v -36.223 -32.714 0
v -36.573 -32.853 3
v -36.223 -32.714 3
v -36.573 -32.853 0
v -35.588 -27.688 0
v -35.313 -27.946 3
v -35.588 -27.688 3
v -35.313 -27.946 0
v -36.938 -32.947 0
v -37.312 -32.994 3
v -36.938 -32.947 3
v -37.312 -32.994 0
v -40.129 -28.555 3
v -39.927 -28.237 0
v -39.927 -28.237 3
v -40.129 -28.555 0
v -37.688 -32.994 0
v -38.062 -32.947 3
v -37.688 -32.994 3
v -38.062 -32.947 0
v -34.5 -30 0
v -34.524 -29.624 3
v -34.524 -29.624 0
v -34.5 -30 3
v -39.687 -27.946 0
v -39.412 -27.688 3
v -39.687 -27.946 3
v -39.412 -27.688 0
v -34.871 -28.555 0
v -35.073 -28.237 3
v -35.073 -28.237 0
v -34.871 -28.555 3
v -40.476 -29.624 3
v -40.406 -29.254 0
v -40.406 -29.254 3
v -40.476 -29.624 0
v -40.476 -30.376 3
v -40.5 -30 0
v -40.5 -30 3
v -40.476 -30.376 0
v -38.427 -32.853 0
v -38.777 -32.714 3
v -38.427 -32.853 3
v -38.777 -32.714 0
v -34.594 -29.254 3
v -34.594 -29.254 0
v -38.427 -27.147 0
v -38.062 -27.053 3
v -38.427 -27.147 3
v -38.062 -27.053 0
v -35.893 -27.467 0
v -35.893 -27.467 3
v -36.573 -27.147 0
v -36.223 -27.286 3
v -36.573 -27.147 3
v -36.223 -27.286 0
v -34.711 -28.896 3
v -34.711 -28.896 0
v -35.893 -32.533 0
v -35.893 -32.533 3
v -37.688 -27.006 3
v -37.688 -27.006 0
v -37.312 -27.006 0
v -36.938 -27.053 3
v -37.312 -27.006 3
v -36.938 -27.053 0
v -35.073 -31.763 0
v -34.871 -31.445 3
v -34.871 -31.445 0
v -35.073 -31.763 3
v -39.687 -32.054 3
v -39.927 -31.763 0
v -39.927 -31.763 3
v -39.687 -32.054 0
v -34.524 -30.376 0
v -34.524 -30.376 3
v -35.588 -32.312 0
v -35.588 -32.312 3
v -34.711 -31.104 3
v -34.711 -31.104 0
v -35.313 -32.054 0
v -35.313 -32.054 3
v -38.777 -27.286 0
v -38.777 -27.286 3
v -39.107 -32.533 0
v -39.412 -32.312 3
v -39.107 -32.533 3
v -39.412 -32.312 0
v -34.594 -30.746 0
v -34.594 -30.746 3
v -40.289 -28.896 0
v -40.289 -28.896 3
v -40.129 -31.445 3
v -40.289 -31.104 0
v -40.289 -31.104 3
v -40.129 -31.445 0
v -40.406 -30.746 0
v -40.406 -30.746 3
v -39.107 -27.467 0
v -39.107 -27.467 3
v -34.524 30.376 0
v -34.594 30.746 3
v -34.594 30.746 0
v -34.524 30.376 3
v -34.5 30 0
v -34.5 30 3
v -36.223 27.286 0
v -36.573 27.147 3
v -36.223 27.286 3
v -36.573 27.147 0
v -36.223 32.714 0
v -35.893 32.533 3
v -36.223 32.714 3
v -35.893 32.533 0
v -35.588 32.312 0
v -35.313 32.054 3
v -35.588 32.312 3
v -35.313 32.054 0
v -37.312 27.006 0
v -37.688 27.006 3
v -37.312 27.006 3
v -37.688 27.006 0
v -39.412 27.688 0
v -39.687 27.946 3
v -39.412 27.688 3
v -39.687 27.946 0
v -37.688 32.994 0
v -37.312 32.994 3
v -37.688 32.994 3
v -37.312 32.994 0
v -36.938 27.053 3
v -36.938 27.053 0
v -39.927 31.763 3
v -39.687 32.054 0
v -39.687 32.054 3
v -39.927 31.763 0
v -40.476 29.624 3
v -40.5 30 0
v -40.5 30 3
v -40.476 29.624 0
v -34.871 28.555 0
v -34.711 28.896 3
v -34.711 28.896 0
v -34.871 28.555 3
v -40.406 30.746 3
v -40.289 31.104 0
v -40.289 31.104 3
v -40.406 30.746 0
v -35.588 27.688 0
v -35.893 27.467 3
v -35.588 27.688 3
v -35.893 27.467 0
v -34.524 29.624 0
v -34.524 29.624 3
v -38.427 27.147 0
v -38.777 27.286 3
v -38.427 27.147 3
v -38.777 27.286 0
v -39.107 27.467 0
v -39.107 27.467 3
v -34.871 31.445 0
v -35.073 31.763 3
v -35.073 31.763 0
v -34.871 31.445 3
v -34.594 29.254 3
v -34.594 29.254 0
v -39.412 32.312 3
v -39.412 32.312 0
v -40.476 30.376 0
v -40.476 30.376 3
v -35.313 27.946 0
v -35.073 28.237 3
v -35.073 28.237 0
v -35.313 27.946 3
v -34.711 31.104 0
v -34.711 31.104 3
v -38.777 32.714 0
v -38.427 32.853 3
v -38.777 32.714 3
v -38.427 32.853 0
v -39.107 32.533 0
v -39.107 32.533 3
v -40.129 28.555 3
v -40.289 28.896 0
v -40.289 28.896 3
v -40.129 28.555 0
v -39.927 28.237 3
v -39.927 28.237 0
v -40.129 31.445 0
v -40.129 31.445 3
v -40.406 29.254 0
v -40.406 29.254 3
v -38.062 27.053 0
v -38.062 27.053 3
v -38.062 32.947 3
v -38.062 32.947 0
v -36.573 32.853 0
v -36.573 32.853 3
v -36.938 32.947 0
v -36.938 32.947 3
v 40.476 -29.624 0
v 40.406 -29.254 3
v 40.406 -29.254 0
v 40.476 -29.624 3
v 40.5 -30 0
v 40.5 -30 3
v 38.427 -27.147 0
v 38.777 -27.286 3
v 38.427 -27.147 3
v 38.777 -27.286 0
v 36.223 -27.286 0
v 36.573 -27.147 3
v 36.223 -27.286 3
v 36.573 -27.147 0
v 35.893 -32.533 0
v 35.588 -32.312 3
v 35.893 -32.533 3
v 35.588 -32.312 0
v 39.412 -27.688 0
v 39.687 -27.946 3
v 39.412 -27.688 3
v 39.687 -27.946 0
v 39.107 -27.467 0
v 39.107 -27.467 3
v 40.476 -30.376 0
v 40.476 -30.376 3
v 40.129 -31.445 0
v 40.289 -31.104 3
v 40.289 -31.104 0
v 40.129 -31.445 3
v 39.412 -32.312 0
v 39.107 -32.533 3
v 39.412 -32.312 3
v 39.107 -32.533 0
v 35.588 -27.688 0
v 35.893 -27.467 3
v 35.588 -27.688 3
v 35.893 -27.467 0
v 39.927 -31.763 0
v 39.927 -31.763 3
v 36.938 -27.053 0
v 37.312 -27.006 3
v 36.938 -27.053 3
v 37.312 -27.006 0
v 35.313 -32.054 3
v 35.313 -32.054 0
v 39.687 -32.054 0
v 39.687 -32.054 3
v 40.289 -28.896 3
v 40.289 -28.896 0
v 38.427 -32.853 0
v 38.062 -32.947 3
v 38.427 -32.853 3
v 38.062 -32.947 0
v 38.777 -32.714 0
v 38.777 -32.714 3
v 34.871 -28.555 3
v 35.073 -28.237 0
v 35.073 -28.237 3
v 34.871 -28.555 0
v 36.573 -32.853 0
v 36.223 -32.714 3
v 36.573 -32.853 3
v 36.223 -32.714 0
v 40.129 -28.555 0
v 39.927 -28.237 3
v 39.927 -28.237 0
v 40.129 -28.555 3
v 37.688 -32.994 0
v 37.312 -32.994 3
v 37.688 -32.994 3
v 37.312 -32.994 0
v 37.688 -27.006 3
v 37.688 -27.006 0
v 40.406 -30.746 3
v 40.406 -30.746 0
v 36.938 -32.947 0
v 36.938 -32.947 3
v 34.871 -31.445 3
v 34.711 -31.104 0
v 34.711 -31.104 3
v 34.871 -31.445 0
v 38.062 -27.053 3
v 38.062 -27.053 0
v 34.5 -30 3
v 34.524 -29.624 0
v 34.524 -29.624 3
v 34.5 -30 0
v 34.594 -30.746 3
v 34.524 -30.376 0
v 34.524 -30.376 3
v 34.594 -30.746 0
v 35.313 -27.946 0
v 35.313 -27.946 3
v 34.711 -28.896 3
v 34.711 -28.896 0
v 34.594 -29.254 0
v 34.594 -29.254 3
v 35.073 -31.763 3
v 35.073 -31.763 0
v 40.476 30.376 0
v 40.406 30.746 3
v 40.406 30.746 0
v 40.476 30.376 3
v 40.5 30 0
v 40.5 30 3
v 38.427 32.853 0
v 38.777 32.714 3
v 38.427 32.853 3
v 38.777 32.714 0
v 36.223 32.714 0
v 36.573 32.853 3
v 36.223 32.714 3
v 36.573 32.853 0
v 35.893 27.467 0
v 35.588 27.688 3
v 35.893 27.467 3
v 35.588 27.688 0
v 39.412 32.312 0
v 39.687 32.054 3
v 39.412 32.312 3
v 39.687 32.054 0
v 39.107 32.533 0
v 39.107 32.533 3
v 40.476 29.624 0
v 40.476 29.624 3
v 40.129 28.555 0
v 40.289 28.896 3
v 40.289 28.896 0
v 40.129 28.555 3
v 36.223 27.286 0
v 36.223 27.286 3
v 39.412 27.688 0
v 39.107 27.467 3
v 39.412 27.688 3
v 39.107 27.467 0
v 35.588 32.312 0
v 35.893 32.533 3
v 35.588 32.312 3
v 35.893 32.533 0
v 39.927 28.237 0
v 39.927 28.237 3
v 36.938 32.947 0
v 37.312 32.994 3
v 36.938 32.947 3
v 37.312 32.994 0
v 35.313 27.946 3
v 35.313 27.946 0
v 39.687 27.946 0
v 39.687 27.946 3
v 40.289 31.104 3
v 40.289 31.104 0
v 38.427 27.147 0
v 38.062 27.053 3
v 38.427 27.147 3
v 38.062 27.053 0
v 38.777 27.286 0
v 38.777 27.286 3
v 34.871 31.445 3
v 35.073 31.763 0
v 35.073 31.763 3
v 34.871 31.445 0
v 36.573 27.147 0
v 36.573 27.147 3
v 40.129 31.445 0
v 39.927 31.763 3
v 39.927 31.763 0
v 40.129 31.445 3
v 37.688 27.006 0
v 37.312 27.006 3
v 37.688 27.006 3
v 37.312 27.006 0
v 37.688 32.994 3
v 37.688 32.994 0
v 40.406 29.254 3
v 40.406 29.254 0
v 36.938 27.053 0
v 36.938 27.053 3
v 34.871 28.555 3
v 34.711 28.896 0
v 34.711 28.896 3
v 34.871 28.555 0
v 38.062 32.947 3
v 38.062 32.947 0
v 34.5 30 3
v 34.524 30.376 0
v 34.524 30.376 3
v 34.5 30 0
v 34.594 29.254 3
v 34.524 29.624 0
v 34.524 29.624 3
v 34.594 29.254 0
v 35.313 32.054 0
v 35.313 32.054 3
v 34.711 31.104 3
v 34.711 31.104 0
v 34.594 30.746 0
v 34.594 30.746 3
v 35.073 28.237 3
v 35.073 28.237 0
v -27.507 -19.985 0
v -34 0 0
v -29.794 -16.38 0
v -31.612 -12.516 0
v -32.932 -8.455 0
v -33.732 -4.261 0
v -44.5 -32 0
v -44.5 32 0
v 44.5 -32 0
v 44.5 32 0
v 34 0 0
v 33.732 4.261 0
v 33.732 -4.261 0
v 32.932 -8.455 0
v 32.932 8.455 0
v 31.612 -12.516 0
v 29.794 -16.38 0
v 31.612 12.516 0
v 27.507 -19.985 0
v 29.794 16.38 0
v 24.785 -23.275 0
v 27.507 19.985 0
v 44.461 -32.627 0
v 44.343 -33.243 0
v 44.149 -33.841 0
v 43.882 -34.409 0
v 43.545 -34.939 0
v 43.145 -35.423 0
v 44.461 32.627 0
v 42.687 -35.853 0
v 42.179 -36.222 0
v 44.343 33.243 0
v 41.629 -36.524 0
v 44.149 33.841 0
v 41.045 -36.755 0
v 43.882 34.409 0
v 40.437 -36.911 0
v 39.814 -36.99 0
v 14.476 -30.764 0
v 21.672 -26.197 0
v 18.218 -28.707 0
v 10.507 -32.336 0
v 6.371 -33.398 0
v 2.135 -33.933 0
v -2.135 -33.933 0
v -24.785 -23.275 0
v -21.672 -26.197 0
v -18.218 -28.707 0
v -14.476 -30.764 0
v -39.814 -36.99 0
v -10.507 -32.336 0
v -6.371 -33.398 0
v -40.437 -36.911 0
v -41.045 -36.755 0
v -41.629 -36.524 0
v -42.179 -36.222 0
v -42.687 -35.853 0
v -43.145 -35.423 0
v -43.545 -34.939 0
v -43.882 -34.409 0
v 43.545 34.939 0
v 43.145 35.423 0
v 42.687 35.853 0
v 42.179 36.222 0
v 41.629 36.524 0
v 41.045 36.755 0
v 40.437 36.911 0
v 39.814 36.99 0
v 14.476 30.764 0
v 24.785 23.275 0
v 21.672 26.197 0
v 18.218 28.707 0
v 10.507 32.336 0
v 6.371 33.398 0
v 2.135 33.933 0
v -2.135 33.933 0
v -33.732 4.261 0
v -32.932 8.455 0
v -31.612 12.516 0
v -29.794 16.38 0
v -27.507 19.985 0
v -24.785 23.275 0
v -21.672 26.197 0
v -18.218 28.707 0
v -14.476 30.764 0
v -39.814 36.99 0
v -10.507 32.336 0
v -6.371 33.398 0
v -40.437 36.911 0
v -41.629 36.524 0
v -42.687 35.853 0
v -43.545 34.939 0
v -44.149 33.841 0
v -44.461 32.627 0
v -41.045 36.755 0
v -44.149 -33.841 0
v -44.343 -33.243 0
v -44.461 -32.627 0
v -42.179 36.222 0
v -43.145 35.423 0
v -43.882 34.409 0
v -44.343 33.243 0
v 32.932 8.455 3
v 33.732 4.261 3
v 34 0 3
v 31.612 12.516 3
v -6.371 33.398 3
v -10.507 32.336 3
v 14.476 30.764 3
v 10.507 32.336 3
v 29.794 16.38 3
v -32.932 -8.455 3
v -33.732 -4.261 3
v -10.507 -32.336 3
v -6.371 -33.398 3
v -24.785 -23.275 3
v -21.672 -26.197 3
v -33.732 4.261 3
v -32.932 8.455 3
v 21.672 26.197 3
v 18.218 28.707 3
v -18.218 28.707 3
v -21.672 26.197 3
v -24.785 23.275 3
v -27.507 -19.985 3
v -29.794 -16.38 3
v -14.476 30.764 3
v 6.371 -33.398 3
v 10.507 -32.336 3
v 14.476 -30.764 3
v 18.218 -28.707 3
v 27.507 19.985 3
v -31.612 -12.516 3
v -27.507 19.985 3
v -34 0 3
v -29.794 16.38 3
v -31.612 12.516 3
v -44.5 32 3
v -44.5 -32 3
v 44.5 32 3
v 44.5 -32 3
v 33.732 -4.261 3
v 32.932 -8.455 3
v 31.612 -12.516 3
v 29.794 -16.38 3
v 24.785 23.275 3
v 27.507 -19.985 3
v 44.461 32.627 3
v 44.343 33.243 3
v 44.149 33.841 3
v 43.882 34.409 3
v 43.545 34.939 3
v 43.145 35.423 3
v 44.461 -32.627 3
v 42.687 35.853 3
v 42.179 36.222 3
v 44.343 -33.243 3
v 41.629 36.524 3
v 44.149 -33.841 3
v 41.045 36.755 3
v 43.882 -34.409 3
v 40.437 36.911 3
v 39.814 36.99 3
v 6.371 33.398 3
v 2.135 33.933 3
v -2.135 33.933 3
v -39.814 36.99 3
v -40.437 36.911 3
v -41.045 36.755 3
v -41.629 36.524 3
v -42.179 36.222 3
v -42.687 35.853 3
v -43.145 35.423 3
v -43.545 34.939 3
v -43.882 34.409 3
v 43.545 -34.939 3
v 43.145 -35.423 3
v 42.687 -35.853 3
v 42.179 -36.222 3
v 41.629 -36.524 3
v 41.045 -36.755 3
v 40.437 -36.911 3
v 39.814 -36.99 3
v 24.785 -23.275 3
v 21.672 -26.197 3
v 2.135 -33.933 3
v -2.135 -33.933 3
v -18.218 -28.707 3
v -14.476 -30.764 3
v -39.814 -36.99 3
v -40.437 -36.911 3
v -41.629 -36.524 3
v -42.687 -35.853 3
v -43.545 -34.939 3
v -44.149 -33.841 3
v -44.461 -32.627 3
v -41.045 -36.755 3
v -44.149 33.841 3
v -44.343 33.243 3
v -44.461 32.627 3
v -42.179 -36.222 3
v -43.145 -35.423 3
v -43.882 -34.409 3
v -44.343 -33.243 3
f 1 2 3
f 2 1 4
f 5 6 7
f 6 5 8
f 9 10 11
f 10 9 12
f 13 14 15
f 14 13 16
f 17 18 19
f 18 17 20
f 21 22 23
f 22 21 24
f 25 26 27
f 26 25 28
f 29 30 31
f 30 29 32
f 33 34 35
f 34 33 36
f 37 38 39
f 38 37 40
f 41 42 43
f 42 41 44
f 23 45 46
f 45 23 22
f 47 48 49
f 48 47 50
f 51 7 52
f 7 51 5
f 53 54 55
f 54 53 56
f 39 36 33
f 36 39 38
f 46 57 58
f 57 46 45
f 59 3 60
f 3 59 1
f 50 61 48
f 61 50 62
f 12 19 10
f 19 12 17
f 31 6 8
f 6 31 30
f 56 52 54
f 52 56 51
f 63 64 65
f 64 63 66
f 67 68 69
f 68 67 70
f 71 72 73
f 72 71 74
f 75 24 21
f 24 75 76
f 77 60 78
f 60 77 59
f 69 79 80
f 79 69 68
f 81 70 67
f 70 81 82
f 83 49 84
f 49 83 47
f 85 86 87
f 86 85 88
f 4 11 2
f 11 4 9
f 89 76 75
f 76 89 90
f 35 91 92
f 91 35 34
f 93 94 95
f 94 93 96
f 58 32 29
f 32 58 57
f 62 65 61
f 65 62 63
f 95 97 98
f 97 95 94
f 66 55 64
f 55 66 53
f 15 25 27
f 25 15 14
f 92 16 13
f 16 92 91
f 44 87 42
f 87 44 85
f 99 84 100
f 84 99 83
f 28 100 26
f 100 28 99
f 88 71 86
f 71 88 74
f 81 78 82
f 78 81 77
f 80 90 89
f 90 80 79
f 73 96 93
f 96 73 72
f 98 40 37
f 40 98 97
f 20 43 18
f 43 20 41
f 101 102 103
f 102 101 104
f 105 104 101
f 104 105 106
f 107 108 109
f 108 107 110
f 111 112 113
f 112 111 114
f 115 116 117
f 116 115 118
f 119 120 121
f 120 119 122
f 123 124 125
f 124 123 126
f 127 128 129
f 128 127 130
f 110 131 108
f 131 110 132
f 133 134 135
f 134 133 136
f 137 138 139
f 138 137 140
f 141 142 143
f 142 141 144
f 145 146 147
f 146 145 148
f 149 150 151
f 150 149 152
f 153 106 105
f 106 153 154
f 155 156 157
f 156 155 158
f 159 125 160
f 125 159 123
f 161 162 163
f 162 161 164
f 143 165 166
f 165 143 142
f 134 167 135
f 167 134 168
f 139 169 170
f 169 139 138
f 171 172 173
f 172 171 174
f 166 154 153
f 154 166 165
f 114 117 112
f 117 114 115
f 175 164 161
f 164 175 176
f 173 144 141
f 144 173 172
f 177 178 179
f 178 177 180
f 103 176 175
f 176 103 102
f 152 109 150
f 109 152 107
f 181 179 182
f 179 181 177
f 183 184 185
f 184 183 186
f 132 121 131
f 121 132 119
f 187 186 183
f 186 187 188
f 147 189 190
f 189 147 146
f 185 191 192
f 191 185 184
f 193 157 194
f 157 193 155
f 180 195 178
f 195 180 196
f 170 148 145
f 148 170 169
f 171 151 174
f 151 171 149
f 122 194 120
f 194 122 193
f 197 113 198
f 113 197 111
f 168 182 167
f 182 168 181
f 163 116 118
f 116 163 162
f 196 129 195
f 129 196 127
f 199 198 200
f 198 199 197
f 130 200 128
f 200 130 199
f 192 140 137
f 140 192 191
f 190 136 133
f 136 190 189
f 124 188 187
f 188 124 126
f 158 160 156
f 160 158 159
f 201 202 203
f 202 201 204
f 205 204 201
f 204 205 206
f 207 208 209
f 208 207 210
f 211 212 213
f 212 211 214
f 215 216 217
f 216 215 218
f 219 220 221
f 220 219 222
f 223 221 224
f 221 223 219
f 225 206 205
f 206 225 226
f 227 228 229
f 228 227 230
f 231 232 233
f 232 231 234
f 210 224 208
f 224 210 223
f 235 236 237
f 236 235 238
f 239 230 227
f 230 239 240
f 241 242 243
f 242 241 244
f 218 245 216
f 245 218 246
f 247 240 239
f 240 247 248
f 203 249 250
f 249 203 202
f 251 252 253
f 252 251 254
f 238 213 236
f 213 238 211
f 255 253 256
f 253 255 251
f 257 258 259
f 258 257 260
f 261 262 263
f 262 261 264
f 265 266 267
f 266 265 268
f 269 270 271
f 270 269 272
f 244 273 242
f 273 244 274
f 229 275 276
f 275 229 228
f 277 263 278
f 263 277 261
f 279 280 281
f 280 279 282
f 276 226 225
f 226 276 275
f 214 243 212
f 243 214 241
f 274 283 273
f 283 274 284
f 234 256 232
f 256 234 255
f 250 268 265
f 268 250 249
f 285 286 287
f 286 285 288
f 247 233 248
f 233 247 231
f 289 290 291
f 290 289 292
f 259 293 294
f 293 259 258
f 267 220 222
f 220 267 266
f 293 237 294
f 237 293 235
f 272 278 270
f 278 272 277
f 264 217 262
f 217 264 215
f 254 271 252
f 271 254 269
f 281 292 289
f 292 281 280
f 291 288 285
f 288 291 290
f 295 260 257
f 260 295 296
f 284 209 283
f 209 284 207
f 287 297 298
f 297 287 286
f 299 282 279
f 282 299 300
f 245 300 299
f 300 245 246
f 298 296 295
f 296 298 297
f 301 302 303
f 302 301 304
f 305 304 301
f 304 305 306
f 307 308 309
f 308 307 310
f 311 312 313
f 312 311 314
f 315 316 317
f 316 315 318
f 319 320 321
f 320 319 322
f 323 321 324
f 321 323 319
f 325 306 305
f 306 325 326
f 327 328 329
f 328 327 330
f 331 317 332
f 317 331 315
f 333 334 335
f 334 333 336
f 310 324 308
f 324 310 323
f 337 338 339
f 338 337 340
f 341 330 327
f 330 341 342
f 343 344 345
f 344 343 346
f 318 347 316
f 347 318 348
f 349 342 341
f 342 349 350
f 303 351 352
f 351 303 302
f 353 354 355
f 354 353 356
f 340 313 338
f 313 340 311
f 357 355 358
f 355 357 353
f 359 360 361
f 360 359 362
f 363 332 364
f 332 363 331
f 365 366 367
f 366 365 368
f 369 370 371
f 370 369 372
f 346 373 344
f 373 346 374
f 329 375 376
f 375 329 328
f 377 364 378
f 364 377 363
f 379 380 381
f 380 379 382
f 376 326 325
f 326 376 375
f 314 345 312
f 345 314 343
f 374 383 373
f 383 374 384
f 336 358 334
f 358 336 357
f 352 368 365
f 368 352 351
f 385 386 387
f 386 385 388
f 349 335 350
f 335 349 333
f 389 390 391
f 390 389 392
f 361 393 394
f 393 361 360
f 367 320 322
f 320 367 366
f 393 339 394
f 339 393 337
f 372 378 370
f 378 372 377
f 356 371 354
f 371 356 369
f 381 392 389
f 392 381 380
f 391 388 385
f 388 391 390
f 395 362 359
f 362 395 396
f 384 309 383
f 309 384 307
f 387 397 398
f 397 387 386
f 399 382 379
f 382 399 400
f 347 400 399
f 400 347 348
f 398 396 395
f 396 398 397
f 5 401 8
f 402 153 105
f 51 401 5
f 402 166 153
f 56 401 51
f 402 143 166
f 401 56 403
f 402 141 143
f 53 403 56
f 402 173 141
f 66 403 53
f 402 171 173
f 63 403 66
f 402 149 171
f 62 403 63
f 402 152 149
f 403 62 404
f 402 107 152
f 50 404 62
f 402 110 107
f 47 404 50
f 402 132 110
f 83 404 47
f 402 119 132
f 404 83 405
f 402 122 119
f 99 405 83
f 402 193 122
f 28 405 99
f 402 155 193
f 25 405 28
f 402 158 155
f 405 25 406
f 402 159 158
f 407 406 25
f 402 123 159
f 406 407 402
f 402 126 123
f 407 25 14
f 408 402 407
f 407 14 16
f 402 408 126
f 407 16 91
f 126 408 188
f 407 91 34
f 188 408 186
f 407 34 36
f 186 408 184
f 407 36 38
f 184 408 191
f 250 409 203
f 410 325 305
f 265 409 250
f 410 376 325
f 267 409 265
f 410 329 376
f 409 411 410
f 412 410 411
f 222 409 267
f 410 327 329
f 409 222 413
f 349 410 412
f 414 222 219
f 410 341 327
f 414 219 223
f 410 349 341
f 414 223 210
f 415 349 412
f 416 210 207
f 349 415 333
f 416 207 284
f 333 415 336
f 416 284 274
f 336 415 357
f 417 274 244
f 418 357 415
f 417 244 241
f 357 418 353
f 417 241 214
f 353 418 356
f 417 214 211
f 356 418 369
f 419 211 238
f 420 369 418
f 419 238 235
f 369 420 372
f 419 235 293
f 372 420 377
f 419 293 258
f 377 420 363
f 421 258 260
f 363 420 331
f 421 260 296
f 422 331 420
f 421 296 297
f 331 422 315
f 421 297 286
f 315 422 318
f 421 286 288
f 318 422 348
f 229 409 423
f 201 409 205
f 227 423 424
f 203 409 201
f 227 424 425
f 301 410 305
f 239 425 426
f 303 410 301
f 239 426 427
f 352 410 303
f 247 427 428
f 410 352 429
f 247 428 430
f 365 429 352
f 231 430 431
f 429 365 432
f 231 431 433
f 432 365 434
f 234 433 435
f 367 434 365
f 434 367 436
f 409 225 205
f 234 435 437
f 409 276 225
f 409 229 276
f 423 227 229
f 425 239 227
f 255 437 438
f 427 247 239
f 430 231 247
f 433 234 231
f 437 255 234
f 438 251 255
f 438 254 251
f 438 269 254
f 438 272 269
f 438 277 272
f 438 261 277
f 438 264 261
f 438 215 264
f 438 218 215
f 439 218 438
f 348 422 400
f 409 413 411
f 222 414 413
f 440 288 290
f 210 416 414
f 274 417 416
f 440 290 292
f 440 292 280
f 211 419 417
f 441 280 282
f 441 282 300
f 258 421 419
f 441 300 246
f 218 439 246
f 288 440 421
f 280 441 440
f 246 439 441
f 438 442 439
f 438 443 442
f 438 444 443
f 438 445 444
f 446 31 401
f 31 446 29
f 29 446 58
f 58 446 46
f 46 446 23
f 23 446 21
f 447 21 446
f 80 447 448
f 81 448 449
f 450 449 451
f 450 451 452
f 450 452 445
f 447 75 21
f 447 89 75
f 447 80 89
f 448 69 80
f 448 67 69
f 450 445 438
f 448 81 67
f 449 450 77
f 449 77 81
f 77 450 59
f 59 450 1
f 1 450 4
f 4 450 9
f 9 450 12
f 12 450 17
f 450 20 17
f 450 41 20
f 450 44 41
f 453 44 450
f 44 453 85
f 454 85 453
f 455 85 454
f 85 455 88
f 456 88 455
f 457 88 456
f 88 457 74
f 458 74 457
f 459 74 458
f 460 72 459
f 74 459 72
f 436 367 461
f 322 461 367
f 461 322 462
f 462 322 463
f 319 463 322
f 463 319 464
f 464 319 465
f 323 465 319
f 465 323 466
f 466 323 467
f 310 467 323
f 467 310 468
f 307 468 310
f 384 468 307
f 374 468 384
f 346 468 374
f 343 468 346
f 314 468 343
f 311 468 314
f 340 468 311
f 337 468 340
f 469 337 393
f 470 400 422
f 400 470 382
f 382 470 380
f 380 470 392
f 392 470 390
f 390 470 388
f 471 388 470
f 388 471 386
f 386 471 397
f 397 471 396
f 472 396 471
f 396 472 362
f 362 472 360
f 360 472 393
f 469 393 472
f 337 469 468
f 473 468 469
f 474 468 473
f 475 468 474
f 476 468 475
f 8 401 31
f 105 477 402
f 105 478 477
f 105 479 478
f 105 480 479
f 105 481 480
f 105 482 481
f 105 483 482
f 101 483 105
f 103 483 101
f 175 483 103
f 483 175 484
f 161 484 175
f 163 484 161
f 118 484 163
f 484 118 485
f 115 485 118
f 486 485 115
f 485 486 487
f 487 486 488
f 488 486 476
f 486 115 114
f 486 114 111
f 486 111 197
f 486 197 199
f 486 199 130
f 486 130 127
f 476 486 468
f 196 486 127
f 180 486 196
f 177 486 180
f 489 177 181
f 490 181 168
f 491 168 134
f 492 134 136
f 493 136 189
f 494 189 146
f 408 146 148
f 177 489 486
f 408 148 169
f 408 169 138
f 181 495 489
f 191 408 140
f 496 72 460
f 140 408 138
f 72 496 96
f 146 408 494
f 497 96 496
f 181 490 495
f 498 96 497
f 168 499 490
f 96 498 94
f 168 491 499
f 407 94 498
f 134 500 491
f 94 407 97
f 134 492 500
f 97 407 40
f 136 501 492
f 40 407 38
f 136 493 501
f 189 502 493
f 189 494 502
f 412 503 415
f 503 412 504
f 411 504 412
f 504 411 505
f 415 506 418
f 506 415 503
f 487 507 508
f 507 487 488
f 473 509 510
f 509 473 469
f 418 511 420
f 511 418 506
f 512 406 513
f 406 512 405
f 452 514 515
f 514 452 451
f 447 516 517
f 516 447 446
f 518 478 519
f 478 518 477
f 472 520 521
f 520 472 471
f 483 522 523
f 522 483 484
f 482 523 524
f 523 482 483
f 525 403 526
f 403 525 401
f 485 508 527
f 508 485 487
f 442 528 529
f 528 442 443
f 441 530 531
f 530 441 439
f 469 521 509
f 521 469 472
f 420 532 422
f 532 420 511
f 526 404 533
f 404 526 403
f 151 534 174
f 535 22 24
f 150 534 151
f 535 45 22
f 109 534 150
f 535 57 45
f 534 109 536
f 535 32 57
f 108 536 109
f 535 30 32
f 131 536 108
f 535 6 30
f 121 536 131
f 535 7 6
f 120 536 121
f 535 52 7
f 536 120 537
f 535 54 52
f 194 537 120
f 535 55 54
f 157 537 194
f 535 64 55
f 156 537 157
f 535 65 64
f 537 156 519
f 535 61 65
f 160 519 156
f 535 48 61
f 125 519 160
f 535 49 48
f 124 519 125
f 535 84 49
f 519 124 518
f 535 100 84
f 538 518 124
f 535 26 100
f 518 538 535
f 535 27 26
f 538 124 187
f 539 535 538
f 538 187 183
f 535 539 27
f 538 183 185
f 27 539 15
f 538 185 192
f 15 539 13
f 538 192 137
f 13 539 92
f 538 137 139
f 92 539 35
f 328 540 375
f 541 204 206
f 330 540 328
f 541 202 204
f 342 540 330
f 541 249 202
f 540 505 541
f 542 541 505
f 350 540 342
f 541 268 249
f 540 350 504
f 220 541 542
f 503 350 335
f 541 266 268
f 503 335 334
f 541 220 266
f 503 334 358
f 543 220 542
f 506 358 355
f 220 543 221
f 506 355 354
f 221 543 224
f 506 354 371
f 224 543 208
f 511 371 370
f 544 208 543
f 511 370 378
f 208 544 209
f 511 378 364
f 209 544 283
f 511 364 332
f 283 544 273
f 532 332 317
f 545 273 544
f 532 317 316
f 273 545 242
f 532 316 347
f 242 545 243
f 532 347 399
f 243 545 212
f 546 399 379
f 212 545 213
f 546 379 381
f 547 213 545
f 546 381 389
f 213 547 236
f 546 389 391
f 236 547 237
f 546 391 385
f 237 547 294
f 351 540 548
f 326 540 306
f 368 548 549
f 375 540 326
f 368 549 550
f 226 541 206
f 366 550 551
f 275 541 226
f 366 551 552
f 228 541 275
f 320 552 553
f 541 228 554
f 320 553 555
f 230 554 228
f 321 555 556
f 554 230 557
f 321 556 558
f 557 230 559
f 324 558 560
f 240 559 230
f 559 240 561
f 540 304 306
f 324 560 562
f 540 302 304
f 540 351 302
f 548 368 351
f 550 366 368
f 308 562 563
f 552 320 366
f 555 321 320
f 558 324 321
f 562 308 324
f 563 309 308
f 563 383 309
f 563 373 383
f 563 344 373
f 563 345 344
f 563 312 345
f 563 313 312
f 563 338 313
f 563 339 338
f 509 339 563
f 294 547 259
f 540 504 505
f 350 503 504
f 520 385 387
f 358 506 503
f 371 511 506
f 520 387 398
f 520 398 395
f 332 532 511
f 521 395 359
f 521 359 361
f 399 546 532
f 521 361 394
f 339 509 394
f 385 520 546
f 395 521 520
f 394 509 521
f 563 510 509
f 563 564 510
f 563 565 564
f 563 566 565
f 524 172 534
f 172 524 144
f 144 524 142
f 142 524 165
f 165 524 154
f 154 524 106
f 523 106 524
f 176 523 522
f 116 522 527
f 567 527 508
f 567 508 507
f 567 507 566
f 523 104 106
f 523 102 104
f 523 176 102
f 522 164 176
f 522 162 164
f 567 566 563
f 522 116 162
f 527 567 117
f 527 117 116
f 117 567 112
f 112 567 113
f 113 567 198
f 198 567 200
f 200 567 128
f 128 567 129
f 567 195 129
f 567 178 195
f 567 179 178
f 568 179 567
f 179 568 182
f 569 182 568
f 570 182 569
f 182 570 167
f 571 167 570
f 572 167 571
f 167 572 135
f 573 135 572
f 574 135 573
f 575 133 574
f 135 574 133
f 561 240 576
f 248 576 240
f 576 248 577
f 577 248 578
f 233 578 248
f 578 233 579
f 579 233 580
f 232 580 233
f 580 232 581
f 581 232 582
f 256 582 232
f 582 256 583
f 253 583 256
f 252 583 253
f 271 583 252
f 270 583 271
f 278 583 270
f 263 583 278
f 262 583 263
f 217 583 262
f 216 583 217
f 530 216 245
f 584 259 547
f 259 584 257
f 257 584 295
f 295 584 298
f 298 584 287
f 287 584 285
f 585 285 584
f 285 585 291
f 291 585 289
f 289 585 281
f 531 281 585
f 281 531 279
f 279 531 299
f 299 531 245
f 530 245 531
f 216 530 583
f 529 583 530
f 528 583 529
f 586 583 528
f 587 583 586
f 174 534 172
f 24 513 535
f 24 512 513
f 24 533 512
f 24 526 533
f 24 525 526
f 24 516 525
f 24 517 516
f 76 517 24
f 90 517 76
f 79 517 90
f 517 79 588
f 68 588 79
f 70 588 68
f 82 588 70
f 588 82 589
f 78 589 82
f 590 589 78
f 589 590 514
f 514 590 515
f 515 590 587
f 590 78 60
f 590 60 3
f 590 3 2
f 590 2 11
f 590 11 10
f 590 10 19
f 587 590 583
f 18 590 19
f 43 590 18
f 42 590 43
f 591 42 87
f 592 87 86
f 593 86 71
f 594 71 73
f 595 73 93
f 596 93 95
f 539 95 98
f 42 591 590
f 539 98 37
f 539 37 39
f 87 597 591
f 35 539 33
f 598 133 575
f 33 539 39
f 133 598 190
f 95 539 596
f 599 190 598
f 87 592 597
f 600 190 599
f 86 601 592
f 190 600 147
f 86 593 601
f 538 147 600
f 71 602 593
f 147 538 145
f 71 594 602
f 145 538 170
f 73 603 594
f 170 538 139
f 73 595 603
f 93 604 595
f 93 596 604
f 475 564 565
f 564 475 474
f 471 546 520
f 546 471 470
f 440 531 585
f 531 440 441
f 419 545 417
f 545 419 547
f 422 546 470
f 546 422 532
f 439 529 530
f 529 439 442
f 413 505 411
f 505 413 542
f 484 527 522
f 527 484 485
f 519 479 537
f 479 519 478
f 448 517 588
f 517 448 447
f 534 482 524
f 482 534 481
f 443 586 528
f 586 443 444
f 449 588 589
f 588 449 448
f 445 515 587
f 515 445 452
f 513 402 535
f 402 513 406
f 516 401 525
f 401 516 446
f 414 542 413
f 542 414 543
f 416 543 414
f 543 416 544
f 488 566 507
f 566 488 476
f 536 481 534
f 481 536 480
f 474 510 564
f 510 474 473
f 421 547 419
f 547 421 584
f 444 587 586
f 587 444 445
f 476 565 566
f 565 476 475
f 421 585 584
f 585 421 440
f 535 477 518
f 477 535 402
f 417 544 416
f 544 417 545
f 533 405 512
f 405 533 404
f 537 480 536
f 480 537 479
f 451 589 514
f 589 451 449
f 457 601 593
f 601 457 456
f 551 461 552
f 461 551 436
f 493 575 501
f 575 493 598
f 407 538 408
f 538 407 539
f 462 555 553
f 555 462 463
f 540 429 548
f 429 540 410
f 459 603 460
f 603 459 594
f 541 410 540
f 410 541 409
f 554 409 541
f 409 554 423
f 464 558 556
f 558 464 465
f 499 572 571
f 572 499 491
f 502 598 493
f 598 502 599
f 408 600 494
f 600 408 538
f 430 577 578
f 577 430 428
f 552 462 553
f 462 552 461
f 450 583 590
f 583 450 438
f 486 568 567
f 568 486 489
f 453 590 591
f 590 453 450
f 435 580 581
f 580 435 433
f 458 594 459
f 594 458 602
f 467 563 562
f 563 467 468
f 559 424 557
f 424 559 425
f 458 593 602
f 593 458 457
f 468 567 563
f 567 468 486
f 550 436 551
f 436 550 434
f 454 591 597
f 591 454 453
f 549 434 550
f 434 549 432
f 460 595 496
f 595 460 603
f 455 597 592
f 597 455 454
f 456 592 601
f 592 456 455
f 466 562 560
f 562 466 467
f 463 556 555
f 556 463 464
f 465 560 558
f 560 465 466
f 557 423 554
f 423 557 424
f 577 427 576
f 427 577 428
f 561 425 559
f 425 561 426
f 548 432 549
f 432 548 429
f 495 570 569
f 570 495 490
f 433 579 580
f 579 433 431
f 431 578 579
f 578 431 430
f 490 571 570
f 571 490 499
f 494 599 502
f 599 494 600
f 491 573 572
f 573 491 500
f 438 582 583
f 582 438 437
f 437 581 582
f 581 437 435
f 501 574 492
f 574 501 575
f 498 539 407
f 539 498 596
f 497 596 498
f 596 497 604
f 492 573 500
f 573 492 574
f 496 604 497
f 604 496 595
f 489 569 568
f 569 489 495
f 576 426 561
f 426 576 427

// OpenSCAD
$fn = 50;


difference() {
	union() {
		hull() {
			translate(v = [-39.5000000000, 32.0000000000, 0]) {
				cylinder(h = 3, r = 5);
			}
			translate(v = [39.5000000000, 32.0000000000, 0]) {
				cylinder(h = 3, r = 5);
			}
			translate(v = [-39.5000000000, -32.0000000000, 0]) {
				cylinder(h = 3, r = 5);
			}
			translate(v = [39.5000000000, -32.0000000000, 0]) {
				cylinder(h = 3, r = 5);
			}
		}
	}
	union() {
		#translate(v = [-37.5000000000, -30.0000000000, -100.0000000000]) {
			cylinder(h = 200, r = 3.0000000000);
		}
		#translate(v = [-37.5000000000, 30.0000000000, -100.0000000000]) {
			cylinder(h = 200, r = 3.0000000000);
		}
		#translate(v = [37.5000000000, -30.0000000000, -100.0000000000]) {
			cylinder(h = 200, r = 3.0000000000);
		}
		#translate(v = [37.5000000000, 30.0000000000, -100.0000000000]) {
			cylinder(h = 200, r = 3.0000000000);
		}
		#cylinder(h = 3, r = 34.0000000000);
	}
}
